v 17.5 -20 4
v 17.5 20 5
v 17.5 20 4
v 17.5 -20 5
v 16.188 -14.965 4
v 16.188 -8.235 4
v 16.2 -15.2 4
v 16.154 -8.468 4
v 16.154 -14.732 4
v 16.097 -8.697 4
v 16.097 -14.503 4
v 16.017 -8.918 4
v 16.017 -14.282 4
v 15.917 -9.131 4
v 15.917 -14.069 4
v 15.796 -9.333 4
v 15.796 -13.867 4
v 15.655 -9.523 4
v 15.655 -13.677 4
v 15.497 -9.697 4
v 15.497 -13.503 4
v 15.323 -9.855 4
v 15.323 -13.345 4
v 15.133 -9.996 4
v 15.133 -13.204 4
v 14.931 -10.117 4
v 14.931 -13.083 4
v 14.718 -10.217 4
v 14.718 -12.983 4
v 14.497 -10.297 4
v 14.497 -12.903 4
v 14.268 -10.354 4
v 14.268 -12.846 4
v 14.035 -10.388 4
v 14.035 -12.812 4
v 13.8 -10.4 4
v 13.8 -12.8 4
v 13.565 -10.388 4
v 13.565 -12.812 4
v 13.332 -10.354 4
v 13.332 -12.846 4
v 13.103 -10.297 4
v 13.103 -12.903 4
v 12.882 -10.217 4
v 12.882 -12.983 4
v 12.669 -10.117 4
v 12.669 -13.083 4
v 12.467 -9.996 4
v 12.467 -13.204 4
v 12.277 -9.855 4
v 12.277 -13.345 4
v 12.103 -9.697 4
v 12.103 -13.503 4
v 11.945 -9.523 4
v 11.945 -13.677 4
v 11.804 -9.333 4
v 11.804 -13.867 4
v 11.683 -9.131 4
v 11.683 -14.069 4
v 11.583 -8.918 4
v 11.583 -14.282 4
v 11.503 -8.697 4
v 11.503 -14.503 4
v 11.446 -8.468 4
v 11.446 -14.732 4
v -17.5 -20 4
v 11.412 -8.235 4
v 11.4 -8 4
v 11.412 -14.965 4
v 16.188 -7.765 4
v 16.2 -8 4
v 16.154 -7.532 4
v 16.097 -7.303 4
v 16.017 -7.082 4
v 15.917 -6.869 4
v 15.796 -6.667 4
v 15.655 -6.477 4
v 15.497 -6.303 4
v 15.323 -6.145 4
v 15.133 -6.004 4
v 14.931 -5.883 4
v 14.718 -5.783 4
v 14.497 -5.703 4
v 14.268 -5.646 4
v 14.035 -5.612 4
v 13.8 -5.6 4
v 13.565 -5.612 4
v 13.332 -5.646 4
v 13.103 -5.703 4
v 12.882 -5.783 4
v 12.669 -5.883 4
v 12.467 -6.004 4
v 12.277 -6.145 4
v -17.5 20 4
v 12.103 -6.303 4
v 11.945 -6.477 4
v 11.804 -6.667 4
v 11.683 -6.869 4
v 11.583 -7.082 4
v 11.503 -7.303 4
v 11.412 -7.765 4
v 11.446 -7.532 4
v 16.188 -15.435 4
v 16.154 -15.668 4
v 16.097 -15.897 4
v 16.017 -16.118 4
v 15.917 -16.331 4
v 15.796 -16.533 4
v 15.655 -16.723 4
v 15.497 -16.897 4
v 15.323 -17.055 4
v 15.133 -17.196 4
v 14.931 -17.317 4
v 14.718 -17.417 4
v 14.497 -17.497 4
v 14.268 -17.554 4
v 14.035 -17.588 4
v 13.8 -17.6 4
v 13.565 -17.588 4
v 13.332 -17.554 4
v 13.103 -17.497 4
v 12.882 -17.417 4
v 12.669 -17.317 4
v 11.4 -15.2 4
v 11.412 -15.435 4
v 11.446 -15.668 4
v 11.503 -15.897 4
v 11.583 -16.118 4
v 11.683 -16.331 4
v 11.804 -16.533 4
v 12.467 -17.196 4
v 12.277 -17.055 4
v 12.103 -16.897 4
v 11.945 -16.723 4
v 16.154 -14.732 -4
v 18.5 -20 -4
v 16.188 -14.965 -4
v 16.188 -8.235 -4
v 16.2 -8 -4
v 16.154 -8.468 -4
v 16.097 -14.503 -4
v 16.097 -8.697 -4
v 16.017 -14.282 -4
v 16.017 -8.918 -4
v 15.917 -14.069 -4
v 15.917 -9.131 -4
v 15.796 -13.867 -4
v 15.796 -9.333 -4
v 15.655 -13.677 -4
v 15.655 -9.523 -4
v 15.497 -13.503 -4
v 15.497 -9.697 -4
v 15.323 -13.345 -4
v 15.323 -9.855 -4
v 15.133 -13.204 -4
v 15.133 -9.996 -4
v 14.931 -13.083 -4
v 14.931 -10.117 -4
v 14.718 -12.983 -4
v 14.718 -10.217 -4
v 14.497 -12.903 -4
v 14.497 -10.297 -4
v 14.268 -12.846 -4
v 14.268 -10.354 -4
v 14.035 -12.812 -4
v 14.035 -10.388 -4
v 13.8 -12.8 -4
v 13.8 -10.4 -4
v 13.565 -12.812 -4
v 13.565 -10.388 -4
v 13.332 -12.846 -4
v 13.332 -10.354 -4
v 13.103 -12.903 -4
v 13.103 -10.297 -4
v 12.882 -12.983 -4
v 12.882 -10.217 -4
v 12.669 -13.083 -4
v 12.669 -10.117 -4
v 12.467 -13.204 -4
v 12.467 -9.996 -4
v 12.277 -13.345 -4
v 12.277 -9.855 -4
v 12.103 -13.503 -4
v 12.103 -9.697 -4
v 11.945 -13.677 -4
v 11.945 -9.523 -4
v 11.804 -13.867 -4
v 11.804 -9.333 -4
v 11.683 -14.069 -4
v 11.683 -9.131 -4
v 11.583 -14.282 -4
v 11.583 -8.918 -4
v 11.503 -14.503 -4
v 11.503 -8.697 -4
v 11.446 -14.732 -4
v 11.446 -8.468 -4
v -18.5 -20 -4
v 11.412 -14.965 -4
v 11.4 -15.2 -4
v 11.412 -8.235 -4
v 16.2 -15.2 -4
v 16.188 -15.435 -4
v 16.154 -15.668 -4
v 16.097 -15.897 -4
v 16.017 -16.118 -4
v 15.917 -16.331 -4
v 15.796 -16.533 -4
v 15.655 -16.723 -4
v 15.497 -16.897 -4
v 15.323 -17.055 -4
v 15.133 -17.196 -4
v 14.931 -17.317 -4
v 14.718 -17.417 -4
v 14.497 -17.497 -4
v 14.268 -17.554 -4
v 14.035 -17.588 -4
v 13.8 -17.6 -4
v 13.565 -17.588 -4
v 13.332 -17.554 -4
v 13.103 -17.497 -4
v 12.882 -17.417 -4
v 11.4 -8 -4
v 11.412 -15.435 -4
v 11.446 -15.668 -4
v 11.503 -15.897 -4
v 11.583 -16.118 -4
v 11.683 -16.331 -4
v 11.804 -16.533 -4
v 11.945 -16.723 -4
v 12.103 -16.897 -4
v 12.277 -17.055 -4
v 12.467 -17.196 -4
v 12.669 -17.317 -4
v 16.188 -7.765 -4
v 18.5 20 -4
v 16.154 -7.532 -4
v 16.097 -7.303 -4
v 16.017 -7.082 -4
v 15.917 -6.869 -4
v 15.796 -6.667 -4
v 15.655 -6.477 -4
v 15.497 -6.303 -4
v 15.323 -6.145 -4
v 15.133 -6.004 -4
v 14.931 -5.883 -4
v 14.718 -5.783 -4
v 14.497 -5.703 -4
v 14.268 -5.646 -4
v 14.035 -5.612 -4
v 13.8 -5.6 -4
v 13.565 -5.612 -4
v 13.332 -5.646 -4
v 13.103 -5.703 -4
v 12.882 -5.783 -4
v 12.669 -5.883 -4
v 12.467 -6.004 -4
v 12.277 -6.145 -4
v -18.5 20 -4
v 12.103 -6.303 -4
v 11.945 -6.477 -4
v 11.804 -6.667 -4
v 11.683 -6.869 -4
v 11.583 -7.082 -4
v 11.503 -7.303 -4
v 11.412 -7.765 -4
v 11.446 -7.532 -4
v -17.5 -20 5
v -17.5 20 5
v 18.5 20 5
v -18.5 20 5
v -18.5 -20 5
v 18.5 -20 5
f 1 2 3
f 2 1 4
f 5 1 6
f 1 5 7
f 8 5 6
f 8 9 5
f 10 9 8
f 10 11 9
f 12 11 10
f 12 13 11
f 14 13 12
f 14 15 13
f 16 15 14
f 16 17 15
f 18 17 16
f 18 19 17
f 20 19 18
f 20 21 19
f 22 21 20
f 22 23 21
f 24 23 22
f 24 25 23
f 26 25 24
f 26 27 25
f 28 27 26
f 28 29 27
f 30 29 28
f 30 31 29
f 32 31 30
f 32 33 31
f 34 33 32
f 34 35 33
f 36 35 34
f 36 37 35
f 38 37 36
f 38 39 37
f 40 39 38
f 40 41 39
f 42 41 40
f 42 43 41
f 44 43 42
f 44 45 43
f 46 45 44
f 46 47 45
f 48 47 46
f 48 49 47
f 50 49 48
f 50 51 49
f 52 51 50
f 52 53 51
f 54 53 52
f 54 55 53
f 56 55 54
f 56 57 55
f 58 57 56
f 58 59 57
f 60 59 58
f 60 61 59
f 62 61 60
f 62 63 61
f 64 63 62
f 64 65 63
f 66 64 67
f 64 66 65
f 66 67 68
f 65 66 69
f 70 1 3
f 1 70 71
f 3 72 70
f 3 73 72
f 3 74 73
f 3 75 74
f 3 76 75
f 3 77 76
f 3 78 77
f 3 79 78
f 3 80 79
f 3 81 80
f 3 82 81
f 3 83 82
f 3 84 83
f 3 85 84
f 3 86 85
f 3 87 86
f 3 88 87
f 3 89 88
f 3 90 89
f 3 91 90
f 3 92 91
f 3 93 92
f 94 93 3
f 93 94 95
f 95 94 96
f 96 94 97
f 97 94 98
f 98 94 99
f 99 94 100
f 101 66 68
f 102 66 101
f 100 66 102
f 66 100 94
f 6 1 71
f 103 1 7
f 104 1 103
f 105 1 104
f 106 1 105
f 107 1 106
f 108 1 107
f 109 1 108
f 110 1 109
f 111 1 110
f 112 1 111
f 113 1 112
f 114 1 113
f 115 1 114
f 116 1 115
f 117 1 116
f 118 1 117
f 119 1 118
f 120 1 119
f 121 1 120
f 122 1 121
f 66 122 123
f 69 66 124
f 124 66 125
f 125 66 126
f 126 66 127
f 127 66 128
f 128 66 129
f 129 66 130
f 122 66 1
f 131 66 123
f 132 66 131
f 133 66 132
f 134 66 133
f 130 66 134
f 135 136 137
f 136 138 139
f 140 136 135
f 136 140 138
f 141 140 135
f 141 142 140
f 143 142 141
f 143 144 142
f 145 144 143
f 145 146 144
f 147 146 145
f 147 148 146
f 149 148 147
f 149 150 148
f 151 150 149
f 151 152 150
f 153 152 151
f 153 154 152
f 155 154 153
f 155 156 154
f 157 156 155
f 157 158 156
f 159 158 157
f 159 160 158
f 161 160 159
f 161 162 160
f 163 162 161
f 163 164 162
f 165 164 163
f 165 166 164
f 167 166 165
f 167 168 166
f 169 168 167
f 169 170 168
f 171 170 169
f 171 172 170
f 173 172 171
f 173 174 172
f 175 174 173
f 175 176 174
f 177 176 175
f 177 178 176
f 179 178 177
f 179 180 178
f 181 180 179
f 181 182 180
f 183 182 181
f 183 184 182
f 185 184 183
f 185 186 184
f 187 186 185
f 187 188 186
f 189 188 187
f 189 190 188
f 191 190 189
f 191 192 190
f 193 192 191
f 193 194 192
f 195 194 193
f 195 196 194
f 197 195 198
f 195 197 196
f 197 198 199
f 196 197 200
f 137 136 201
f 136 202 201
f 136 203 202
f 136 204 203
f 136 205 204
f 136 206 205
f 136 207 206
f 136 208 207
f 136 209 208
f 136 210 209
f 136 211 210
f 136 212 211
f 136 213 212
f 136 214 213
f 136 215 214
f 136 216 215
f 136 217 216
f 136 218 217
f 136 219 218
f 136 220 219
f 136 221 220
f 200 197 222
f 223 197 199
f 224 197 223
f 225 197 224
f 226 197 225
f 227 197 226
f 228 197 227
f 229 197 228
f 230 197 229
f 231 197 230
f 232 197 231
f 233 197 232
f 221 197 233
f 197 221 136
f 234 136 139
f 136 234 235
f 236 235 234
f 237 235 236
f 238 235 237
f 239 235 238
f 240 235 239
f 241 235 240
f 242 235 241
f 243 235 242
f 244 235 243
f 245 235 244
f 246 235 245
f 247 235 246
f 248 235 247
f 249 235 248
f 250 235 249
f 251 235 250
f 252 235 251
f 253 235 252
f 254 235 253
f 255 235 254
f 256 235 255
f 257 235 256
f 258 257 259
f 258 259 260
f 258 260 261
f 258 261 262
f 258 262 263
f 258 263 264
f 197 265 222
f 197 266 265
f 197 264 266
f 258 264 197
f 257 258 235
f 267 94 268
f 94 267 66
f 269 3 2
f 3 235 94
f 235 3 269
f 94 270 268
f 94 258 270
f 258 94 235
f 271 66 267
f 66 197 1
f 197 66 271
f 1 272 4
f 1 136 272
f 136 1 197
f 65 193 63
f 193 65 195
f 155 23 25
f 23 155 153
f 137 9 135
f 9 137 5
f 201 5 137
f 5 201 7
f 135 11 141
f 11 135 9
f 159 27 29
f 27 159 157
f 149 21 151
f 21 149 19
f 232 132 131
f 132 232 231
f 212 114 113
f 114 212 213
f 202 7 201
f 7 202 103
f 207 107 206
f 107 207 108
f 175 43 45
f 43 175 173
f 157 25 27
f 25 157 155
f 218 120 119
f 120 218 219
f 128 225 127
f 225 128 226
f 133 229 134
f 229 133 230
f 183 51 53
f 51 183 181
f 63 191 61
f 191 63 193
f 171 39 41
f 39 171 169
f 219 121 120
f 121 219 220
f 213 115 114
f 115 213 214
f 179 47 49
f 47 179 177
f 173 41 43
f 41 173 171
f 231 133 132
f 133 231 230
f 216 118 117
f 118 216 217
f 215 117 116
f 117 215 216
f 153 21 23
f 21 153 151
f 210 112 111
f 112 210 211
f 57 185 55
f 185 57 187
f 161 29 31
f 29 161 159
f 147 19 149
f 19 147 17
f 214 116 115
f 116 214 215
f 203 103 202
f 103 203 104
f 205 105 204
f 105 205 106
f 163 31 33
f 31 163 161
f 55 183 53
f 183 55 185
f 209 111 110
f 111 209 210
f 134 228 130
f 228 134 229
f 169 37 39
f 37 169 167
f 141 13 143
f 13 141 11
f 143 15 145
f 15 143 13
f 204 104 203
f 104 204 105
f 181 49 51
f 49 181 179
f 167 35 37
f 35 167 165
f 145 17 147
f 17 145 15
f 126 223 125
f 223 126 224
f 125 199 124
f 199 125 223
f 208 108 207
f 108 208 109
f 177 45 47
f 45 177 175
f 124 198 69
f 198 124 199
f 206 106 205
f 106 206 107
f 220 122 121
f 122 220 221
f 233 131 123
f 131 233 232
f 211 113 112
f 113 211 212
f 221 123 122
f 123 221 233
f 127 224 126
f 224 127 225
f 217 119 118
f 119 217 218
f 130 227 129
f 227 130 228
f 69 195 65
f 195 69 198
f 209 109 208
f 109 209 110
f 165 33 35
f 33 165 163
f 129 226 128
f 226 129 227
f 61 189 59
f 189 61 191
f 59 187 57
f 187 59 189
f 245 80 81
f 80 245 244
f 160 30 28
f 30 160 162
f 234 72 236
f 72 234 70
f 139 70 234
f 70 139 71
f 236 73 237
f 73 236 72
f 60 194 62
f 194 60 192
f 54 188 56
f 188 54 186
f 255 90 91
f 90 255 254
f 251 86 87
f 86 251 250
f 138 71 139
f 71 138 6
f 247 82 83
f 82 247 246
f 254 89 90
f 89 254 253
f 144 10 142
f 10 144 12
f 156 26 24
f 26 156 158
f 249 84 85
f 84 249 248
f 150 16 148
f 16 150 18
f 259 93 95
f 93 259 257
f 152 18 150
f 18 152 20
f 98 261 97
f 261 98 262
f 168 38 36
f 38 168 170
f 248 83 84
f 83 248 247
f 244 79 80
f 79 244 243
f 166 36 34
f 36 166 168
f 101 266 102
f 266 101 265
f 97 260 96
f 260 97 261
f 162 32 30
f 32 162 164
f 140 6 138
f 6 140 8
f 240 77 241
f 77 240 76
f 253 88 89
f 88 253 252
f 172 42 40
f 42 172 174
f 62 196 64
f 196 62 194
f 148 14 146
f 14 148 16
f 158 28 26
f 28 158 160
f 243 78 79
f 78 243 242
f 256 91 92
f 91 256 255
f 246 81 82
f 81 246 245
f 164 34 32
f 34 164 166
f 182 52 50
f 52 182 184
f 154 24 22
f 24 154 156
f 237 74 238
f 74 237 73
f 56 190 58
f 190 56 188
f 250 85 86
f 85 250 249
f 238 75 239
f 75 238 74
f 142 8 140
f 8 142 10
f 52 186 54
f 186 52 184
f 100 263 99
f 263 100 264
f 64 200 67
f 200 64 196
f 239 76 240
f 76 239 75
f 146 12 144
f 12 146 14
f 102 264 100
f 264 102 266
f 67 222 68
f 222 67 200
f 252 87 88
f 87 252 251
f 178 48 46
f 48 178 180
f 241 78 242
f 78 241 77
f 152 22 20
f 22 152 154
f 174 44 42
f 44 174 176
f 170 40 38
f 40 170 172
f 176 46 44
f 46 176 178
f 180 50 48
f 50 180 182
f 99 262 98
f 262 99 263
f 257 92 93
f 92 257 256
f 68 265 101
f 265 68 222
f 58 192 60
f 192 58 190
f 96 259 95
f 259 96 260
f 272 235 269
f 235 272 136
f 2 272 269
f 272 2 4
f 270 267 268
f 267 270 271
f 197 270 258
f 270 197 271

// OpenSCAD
railX=35;
railY=40;
railZ=8;
holeD=4.8;
holeX=railX/2-3.7;
hole1Y=-railY/2+4.8;
hole2Y=-railY/2+(4.5+7.5);
frameThickness=1;

module frontrightspacer()
{
difference() {
    cube([railX,railY,railZ],center=true);
    translate([holeX,hole1Y,0])cylinder(d=holeD,h=railZ,$fn=64,center=true);
    translate([holeX,hole2Y,0])cylinder(d=holeD,h=railZ,$fn=64,center=true);
}

//Frame
translate([railX/2+frameThickness/2,0,frameThickness/2])cube([frameThickness,railY,railZ+frameThickness],center=true);
translate([-railX/2-frameThickness/2,0,frameThickness/2])cube([frameThickness,railY,railZ+frameThickness],center=true);

}

frontrightspacer();
